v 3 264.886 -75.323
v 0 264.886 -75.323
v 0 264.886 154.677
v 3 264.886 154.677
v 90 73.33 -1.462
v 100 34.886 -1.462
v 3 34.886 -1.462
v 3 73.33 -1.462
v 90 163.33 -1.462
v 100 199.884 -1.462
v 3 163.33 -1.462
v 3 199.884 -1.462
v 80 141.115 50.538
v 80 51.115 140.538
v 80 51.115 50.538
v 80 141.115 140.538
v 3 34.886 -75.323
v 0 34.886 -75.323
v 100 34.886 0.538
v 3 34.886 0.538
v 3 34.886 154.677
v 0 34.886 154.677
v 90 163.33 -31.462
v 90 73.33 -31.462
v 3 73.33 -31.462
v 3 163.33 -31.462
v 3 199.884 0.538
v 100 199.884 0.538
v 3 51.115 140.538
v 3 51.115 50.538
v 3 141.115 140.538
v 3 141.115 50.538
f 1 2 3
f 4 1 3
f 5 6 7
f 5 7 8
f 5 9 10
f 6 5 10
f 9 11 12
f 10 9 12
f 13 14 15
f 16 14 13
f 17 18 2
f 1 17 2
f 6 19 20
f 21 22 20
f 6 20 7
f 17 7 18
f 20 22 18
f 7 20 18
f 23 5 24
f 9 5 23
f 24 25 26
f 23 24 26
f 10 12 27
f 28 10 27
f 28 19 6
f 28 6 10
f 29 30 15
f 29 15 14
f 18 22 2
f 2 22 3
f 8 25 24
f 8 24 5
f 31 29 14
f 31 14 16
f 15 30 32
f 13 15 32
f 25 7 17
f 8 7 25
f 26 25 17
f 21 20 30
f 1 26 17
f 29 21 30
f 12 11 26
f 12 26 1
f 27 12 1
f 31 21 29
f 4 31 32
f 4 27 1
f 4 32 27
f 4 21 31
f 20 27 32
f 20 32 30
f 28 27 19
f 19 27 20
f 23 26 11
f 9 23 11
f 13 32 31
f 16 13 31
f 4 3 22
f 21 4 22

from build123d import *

# Parameters (mm, degrees)
F0_W     = 90
F0_H     = 90
F1_DEPTH = 3
F0_H_2   = 30
F2_DEPTH = 90
F3_DEPTH = 100
F4_DEPTH = 80


with BuildPart() as f1:
    # F0 (on Right) → F1 (new body)
    with BuildSketch(Plane.YZ):
        Polygon((264.885695, 154.677426), (34.885695, 154.677426), (34.885695, 0.538323), (199.884153, 0.538323), (199.884153, -1.461677), (163.329955, -1.461677), (163.329955, -31.461677), (73.329955, -31.461677), (73.329955, -1.461677), (34.885695, -1.461677), (34.885695, -75.322574), (264.885695, -75.322574), align=None)
        with Locations((96.11488, 95.538323)):
            Rectangle(F0_W, F0_H, mode=Mode.SUBTRACT)
    extrude(amount=F1_DEPTH)

    # F0 (on Right) → F2 (join)
    with BuildSketch(Plane.YZ):
        with Locations((118.329955, -16.461677)):
            Rectangle(F0_W, F0_H_2)
    extrude(amount=F2_DEPTH)

    # F0 (on Right) → F3 (join)
    with BuildSketch(Plane.YZ):
        Polygon((199.884153, 0.538323), (34.885695, 0.538323), (34.885695, -1.461677), (73.329955, -1.461677), (163.329955, -1.461677), (199.884153, -1.461677), align=None)
    extrude(amount=F3_DEPTH)

    # F0 (on Right) → F4 (join)
    with BuildSketch(Plane.YZ):
        with Locations((96.11488, 95.538323)):
            Rectangle(F0_W, F0_H)
    extrude(amount=F4_DEPTH)


solid = f1.part
